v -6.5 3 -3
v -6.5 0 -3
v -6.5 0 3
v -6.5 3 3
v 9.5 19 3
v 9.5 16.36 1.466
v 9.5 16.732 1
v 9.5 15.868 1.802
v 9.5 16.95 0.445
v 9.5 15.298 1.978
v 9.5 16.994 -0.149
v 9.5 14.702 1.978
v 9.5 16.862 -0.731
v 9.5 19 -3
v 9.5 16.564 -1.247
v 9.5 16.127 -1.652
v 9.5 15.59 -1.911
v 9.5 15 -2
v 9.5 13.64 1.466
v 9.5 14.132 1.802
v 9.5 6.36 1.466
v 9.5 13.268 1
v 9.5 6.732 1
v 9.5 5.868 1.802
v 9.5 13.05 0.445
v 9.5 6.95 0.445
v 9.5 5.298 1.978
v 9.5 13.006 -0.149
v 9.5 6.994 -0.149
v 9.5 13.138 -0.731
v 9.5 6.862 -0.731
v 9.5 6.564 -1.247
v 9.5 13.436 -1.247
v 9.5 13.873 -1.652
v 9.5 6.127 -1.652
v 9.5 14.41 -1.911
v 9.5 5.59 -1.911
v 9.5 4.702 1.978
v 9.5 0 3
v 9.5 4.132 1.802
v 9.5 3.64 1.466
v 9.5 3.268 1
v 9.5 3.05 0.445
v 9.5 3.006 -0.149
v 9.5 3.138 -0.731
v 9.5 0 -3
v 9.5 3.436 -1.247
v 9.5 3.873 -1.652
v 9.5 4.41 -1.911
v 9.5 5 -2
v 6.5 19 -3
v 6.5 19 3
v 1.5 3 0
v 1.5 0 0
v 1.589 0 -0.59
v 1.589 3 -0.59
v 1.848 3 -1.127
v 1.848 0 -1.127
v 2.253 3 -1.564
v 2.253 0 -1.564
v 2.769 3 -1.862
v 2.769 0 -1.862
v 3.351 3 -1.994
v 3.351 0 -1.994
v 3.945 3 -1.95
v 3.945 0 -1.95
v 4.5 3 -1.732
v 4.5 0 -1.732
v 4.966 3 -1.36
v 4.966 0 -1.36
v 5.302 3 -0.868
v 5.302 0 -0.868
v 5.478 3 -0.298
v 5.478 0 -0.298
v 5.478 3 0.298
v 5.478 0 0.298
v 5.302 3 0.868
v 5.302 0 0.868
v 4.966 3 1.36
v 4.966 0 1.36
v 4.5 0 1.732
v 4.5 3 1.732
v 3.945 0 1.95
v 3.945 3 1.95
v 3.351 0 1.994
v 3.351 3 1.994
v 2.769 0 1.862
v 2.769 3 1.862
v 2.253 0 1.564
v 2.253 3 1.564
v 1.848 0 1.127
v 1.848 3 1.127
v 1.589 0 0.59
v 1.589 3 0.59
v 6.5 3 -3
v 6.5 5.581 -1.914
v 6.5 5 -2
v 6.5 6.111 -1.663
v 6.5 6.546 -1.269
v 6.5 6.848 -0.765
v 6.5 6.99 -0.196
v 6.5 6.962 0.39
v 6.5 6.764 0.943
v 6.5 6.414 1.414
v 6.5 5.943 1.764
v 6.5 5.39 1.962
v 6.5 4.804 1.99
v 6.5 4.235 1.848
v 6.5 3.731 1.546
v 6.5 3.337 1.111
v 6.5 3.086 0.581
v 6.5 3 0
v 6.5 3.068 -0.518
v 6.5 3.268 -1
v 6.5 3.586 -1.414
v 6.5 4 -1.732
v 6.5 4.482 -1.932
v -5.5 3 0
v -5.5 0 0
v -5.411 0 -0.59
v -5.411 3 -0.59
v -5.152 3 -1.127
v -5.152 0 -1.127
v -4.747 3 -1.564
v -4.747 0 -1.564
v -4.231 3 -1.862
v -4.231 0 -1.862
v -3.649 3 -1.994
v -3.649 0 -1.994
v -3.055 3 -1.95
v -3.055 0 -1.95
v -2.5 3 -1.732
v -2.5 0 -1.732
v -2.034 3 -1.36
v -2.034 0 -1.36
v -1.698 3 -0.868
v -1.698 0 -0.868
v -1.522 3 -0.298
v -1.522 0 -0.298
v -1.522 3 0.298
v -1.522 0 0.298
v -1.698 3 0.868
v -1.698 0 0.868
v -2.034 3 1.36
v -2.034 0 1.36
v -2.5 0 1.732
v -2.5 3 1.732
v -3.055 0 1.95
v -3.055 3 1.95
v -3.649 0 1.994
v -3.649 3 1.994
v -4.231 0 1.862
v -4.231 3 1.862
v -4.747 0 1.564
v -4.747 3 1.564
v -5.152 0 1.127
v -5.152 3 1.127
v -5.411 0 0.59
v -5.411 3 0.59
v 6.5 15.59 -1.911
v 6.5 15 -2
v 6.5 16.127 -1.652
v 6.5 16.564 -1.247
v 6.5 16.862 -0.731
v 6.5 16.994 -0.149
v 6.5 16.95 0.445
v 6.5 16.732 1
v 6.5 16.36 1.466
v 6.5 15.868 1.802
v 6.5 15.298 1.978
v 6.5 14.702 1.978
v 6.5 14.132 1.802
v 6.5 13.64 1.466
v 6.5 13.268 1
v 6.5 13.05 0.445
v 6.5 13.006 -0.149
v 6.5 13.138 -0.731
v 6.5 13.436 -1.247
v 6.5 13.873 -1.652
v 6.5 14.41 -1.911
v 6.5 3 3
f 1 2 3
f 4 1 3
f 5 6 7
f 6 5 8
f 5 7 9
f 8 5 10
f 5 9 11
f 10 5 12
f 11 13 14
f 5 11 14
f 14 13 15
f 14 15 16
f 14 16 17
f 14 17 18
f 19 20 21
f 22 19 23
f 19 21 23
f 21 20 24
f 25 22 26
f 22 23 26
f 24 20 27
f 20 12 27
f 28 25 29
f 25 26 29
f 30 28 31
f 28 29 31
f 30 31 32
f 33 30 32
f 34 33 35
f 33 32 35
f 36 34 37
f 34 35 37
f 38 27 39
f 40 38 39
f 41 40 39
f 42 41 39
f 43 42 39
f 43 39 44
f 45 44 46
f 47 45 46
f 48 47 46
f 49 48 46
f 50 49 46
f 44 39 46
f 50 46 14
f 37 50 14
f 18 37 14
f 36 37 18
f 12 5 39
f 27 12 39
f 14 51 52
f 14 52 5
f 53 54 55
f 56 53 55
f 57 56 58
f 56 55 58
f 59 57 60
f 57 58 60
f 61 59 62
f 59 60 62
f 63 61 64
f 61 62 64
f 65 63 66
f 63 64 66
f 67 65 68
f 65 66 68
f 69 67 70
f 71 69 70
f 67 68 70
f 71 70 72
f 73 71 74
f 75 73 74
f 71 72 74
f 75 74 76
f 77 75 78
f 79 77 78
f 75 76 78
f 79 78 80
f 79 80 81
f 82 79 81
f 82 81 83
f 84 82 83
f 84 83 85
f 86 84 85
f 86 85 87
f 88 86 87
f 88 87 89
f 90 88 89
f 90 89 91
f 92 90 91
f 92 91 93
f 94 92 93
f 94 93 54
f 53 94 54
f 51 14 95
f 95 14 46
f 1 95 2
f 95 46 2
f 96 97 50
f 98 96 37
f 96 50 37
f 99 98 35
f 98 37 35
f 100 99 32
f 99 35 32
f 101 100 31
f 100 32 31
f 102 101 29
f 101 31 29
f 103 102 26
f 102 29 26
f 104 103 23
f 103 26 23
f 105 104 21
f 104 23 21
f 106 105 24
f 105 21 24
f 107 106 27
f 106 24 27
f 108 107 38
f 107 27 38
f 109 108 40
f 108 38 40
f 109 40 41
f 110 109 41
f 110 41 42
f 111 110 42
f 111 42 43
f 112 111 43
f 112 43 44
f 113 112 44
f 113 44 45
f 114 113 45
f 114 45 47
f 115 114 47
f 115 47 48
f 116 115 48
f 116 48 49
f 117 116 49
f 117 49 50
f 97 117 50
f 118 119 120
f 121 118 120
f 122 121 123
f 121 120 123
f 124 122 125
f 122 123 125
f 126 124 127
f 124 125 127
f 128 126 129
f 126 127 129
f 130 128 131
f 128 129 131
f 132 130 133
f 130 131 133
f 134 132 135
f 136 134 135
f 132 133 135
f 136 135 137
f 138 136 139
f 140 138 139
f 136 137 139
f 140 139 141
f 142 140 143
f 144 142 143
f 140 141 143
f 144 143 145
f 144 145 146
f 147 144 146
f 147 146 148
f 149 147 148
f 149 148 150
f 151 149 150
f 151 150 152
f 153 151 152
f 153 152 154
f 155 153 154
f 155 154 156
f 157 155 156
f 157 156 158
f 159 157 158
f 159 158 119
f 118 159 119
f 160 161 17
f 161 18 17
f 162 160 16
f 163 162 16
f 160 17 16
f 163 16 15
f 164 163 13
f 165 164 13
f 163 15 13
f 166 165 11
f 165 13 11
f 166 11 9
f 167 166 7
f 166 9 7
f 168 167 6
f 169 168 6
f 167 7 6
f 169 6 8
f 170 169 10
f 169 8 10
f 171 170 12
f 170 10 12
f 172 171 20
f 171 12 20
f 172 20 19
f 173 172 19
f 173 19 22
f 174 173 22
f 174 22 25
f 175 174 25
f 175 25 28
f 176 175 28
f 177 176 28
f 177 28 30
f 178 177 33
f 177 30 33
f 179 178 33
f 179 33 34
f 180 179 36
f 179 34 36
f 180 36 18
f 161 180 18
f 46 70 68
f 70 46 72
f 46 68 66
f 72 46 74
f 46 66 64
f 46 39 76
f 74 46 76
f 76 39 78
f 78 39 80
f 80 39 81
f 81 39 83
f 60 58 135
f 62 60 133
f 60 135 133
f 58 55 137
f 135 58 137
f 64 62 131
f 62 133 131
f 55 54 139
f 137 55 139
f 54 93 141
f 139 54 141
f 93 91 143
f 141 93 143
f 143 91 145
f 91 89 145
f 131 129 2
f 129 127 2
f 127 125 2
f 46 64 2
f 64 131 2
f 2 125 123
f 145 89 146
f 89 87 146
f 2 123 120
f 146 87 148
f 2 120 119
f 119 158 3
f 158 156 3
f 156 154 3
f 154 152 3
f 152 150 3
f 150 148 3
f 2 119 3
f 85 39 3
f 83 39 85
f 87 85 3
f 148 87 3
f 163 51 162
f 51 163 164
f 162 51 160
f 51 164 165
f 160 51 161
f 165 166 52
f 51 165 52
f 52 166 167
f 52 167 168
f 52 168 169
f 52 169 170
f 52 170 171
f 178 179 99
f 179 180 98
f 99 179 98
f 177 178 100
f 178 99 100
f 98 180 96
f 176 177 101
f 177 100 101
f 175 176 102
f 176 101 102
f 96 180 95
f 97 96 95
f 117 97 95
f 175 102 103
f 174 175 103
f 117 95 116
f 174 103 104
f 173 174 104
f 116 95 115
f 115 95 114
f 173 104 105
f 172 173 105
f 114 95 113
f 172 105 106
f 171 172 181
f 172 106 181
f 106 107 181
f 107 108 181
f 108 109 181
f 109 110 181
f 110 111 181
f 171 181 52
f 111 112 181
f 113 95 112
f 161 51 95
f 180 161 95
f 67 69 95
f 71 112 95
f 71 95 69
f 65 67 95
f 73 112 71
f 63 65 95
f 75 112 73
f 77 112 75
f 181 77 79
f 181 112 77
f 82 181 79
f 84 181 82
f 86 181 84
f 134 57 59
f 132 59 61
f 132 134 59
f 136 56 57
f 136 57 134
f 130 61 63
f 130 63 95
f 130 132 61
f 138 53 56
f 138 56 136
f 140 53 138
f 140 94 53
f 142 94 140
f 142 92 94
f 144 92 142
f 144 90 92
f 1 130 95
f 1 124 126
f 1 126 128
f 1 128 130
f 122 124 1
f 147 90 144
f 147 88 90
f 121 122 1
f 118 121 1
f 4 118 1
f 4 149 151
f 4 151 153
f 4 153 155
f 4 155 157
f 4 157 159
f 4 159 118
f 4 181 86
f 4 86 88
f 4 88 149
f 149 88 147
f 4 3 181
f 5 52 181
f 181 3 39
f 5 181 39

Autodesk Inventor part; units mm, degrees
ref_plane "YZ Plane" through (0, 0, 0) normal (1, 0, 0) x (0, 1, 0)
ref_plane "XZ Plane" through (0, 0, 0) normal (0, 1, 0) x (-1, 0, 0)
ref_plane "XY Plane" through (0, 0, 0) normal (0, 0, 1) x (1, 0, 0)
sketch "Sketch1" plane through (0, 0, 0) normal (0, 1, 0) x (-1, 0, 0)
  line L0 (-9.5, -3) -> (6.5, -3)
  line L1 (6.5, -3) -> (6.5, 3)
  line L2 (6.5, 3) -> (-9.5, 3)
  line L3 (-9.5, 3) -> (-9.5, -3)
  circle A0 centre (3.5, 0) radius 2
  circle A1 centre (-3.5, 0) radius 2
  point P0 (0, 0)
  dimension "d0" = 4
  dimension "d3" = 3.5
  dimension "d4" = 4
  dimension "d5" = 3.5
  dimension "d6" = 7
  dimension "d7" = 6
  dimension "d8" = 3
  dimension "d9" = 3
  dimension "d10" = 3
  dimension "d11" = 6
extrude "Bottom Extrusion" add sketch "Sketch1" along normal blind 3
sketch "Sketch2" plane through (0, 3, 0) normal (0, 1, 0) x (1, 0, 0)
  line L0 (-6.5, -3) -> (9.5, -3) construction
  line L1 (9.5, -3) -> (9.5, 3) construction
  line L2 (9.5, 3) -> (6.5, 3)
  line L3 (6.5, 3) -> (6.5, -3)
  line L4 (6.5, -3) -> (9.5, -3)
  line L5 (9.5, -3) -> (9.5, 3)
  point P0 (0, 0)
  dimension "d14" = 3
extrude "Top Extrusion" add sketch "Sketch2" along normal blind 16
sketch "Sketch3" plane through (9.5, 0, 3) normal (1, 0, 0) x (0, 0, -1)
  line L0 (0, 19) -> (6, 19) construction
  circle A0 centre (3, 5) radius 2
  circle A1 centre (3, 15) radius 2
  point P0 (3, 0)
  dimension "d17" = 4
  dimension "d18" = 5
  dimension "d19" = 4
  dimension "d20" = 10
  dimension "d21" = 4
extrude "Top Holes" cut sketch "Sketch3" against normal through all
properties part number "Servo Locks V3"
